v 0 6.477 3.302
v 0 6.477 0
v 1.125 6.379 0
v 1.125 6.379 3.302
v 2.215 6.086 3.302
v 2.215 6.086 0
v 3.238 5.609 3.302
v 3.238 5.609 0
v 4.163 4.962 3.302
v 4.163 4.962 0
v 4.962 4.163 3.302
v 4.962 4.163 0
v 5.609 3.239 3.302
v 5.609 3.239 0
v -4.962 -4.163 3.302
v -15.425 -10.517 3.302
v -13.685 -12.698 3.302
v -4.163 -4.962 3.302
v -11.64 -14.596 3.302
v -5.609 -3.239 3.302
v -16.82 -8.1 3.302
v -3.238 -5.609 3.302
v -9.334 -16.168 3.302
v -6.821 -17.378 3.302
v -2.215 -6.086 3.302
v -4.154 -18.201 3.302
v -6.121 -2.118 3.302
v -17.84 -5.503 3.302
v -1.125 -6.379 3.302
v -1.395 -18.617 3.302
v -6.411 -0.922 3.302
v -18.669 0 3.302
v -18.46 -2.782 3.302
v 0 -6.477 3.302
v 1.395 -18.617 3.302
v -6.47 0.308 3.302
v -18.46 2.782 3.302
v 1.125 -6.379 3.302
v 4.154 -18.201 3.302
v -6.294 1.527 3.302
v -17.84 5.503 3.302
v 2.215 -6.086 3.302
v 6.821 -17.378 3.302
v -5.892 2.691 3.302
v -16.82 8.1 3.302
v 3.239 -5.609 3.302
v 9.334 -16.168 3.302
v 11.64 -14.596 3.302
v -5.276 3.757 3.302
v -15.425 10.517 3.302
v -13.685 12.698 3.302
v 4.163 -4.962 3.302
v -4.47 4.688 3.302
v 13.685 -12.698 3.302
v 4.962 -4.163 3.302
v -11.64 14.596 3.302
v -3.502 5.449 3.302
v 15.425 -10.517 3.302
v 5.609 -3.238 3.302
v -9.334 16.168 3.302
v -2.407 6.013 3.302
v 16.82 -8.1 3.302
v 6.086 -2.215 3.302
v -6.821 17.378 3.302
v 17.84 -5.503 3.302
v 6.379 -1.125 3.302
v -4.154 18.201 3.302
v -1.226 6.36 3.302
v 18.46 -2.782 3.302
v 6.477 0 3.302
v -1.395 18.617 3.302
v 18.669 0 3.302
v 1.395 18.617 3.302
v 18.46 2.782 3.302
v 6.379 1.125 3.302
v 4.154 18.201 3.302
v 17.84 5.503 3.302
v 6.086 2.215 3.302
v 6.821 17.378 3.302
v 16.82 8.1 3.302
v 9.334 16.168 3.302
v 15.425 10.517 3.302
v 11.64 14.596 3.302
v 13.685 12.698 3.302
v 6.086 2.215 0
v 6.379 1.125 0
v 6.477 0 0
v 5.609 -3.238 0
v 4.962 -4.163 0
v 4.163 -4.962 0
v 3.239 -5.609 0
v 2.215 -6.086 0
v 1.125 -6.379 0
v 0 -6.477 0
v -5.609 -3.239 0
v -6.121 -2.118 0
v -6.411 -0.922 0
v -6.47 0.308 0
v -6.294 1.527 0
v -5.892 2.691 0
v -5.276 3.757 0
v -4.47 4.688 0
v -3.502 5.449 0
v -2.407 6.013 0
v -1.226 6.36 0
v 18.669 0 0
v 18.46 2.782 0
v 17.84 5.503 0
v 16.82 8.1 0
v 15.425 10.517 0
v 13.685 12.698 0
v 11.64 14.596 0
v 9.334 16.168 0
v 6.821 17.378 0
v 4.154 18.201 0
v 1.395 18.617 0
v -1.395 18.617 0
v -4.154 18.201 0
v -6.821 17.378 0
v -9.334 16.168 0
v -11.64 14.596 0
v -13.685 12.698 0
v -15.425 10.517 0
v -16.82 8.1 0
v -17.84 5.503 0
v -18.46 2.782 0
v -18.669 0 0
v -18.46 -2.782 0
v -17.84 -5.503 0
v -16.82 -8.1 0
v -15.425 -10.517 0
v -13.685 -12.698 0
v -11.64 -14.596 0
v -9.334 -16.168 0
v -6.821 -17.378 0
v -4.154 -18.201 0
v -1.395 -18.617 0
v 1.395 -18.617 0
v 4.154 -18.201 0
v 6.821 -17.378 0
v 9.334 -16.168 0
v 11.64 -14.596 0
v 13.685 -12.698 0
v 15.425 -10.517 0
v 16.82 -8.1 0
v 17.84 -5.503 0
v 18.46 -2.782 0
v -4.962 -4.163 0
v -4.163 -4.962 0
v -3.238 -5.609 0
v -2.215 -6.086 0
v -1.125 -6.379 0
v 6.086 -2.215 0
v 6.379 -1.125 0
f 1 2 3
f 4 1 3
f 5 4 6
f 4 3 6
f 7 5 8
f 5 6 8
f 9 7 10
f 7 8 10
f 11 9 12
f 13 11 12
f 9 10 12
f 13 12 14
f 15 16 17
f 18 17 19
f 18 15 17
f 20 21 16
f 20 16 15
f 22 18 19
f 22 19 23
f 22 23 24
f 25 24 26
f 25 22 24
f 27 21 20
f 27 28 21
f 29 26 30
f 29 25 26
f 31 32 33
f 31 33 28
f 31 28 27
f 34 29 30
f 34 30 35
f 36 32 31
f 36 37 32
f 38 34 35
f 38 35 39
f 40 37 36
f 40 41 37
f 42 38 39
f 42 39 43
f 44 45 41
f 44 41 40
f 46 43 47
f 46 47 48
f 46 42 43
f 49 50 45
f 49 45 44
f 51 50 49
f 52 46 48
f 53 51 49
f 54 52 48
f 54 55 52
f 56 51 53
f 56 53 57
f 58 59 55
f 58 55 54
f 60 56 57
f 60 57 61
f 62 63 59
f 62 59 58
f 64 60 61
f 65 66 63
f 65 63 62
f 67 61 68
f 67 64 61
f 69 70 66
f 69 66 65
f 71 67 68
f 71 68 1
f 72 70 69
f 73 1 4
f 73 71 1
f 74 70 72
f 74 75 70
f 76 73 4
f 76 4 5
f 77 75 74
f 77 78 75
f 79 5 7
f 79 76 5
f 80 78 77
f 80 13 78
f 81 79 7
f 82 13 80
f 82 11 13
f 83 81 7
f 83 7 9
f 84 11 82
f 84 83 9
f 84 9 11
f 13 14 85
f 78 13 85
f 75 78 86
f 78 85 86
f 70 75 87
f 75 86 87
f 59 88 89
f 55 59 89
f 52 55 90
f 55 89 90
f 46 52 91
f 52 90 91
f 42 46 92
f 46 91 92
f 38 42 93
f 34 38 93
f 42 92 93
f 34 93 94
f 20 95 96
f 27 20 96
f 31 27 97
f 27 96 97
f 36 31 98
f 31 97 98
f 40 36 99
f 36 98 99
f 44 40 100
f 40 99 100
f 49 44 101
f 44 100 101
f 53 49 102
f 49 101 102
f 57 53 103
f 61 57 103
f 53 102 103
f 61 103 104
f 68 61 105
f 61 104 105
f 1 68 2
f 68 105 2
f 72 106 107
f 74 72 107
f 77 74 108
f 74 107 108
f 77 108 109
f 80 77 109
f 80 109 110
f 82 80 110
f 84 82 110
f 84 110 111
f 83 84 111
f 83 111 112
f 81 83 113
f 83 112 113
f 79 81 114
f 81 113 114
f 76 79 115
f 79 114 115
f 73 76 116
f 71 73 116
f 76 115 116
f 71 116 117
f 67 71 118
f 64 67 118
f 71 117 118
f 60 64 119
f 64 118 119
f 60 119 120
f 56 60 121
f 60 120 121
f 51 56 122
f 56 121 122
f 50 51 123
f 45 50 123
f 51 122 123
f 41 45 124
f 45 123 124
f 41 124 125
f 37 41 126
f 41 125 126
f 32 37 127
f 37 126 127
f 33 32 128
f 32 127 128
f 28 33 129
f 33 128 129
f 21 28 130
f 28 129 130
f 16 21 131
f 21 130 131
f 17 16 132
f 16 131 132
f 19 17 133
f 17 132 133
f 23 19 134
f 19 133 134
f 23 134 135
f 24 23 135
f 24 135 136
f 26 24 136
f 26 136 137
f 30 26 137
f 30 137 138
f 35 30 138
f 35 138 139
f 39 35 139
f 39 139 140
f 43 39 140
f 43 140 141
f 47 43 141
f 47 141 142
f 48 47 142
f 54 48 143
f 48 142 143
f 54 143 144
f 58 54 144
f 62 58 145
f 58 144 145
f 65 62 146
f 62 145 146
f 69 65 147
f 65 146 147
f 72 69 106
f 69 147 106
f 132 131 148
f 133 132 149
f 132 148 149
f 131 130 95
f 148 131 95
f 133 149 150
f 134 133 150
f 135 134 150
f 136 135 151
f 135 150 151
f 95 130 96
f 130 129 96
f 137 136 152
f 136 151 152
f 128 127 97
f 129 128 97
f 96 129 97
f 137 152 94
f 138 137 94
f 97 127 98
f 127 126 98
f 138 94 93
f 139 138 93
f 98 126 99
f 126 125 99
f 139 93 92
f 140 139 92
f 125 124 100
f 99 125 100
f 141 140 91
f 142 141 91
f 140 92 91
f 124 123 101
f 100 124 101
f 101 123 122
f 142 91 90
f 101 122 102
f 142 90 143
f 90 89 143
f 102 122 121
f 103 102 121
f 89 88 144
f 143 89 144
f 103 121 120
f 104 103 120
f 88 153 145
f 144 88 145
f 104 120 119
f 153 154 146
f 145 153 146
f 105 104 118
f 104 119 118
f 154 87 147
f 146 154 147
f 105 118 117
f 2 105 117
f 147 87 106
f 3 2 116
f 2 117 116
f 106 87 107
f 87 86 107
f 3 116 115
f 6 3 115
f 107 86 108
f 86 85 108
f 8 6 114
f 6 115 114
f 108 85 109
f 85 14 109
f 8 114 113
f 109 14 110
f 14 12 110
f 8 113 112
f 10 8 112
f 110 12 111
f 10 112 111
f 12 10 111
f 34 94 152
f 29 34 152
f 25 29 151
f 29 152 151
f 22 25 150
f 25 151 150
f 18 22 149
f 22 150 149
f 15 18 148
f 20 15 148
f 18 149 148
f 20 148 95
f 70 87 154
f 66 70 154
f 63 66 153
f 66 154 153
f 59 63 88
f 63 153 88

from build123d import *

# Parameters (mm, degrees)
F0_R     = 18.669
F1_DEPTH = 3.302


# Not quite as in the source:
# - a length typed as a fraction of an inch, garbled in the dataset ("3 / 203.2 mm" for 3/8 in), is restored


with BuildPart() as f1:
    # F0 (on Top) → F1 (new body)
    with BuildSketch(Plane.XY):
        Circle(F0_R)
        Polygon((-5.6092465283, 3.2385000208), (-3.7394976935, 6.477), (0, 6.477), (3.7394976935, 6.477), (5.6092465069, 3.238500058), (7.4789953871, 0), (5.6092465631, -3.2384999606), (3.7394976935, -6.477), (0, -6.477), (-3.7394976935, -6.477), (-5.6092464752, -3.2385001127), (-7.4789953871, 0), align=None, mode=Mode.SUBTRACT)
        with BuildLine():
            Line((0, 6.477), (-3.7394976935, 6.477))
            Line((-3.7394976935, 6.477), (-5.6092465283, 3.2385000208))
            ThreePointArc((-5.6092465283, 3.2385000208), (-3.2384999896, 5.6092465463), (0, 6.477))
        make_face()
        with BuildLine():
            Line((3.7394976935, 6.477), (0, 6.477))
            ThreePointArc((0, 6.477), (3.238499971, 5.609246557), (5.6092465069, 3.238500058))
            Line((5.6092465069, 3.238500058), (3.7394976935, 6.477))
        make_face()
        with BuildLine():
            ThreePointArc((5.6092465631, -3.2384999606), (3.2385000197, -5.6092465289), (0, -6.477))
            Line((0, -6.477), (3.7394976935, -6.477))
            Line((3.7394976935, -6.477), (5.6092465631, -3.2384999606))
        make_face()
        with BuildLine():
            Line((7.4789953871, 0), (5.6092465069, 3.238500058))
            ThreePointArc((5.6092465069, 3.238500058), (6.2563015682, 1.6763709874), (6.477, 0))
            ThreePointArc((6.477, 0), (6.2563015828, -1.6763709332), (5.6092465631, -3.2384999606))
            Line((5.6092465631, -3.2384999606), (7.4789953871, 0))
        make_face()
        with BuildLine():
            ThreePointArc((0, -6.477), (-3.2384999437, -5.6092465728), (-5.6092464752, -3.2385001127))
            Line((-5.6092464752, -3.2385001127), (-3.7394976935, -6.477))
            Line((-3.7394976935, -6.477), (0, -6.477))
        make_face()
        with BuildLine():
            ThreePointArc((-5.6092464752, -3.2385001127), (-6.477, -5.31e-08), (-5.6092465283, 3.2385000208))
            Line((-5.6092465283, 3.2385000208), (-7.4789953871, 0))
            Line((-7.4789953871, 0), (-5.6092464752, -3.2385001127))
        make_face()
    extrude(amount=F1_DEPTH)


solid = f1.part
